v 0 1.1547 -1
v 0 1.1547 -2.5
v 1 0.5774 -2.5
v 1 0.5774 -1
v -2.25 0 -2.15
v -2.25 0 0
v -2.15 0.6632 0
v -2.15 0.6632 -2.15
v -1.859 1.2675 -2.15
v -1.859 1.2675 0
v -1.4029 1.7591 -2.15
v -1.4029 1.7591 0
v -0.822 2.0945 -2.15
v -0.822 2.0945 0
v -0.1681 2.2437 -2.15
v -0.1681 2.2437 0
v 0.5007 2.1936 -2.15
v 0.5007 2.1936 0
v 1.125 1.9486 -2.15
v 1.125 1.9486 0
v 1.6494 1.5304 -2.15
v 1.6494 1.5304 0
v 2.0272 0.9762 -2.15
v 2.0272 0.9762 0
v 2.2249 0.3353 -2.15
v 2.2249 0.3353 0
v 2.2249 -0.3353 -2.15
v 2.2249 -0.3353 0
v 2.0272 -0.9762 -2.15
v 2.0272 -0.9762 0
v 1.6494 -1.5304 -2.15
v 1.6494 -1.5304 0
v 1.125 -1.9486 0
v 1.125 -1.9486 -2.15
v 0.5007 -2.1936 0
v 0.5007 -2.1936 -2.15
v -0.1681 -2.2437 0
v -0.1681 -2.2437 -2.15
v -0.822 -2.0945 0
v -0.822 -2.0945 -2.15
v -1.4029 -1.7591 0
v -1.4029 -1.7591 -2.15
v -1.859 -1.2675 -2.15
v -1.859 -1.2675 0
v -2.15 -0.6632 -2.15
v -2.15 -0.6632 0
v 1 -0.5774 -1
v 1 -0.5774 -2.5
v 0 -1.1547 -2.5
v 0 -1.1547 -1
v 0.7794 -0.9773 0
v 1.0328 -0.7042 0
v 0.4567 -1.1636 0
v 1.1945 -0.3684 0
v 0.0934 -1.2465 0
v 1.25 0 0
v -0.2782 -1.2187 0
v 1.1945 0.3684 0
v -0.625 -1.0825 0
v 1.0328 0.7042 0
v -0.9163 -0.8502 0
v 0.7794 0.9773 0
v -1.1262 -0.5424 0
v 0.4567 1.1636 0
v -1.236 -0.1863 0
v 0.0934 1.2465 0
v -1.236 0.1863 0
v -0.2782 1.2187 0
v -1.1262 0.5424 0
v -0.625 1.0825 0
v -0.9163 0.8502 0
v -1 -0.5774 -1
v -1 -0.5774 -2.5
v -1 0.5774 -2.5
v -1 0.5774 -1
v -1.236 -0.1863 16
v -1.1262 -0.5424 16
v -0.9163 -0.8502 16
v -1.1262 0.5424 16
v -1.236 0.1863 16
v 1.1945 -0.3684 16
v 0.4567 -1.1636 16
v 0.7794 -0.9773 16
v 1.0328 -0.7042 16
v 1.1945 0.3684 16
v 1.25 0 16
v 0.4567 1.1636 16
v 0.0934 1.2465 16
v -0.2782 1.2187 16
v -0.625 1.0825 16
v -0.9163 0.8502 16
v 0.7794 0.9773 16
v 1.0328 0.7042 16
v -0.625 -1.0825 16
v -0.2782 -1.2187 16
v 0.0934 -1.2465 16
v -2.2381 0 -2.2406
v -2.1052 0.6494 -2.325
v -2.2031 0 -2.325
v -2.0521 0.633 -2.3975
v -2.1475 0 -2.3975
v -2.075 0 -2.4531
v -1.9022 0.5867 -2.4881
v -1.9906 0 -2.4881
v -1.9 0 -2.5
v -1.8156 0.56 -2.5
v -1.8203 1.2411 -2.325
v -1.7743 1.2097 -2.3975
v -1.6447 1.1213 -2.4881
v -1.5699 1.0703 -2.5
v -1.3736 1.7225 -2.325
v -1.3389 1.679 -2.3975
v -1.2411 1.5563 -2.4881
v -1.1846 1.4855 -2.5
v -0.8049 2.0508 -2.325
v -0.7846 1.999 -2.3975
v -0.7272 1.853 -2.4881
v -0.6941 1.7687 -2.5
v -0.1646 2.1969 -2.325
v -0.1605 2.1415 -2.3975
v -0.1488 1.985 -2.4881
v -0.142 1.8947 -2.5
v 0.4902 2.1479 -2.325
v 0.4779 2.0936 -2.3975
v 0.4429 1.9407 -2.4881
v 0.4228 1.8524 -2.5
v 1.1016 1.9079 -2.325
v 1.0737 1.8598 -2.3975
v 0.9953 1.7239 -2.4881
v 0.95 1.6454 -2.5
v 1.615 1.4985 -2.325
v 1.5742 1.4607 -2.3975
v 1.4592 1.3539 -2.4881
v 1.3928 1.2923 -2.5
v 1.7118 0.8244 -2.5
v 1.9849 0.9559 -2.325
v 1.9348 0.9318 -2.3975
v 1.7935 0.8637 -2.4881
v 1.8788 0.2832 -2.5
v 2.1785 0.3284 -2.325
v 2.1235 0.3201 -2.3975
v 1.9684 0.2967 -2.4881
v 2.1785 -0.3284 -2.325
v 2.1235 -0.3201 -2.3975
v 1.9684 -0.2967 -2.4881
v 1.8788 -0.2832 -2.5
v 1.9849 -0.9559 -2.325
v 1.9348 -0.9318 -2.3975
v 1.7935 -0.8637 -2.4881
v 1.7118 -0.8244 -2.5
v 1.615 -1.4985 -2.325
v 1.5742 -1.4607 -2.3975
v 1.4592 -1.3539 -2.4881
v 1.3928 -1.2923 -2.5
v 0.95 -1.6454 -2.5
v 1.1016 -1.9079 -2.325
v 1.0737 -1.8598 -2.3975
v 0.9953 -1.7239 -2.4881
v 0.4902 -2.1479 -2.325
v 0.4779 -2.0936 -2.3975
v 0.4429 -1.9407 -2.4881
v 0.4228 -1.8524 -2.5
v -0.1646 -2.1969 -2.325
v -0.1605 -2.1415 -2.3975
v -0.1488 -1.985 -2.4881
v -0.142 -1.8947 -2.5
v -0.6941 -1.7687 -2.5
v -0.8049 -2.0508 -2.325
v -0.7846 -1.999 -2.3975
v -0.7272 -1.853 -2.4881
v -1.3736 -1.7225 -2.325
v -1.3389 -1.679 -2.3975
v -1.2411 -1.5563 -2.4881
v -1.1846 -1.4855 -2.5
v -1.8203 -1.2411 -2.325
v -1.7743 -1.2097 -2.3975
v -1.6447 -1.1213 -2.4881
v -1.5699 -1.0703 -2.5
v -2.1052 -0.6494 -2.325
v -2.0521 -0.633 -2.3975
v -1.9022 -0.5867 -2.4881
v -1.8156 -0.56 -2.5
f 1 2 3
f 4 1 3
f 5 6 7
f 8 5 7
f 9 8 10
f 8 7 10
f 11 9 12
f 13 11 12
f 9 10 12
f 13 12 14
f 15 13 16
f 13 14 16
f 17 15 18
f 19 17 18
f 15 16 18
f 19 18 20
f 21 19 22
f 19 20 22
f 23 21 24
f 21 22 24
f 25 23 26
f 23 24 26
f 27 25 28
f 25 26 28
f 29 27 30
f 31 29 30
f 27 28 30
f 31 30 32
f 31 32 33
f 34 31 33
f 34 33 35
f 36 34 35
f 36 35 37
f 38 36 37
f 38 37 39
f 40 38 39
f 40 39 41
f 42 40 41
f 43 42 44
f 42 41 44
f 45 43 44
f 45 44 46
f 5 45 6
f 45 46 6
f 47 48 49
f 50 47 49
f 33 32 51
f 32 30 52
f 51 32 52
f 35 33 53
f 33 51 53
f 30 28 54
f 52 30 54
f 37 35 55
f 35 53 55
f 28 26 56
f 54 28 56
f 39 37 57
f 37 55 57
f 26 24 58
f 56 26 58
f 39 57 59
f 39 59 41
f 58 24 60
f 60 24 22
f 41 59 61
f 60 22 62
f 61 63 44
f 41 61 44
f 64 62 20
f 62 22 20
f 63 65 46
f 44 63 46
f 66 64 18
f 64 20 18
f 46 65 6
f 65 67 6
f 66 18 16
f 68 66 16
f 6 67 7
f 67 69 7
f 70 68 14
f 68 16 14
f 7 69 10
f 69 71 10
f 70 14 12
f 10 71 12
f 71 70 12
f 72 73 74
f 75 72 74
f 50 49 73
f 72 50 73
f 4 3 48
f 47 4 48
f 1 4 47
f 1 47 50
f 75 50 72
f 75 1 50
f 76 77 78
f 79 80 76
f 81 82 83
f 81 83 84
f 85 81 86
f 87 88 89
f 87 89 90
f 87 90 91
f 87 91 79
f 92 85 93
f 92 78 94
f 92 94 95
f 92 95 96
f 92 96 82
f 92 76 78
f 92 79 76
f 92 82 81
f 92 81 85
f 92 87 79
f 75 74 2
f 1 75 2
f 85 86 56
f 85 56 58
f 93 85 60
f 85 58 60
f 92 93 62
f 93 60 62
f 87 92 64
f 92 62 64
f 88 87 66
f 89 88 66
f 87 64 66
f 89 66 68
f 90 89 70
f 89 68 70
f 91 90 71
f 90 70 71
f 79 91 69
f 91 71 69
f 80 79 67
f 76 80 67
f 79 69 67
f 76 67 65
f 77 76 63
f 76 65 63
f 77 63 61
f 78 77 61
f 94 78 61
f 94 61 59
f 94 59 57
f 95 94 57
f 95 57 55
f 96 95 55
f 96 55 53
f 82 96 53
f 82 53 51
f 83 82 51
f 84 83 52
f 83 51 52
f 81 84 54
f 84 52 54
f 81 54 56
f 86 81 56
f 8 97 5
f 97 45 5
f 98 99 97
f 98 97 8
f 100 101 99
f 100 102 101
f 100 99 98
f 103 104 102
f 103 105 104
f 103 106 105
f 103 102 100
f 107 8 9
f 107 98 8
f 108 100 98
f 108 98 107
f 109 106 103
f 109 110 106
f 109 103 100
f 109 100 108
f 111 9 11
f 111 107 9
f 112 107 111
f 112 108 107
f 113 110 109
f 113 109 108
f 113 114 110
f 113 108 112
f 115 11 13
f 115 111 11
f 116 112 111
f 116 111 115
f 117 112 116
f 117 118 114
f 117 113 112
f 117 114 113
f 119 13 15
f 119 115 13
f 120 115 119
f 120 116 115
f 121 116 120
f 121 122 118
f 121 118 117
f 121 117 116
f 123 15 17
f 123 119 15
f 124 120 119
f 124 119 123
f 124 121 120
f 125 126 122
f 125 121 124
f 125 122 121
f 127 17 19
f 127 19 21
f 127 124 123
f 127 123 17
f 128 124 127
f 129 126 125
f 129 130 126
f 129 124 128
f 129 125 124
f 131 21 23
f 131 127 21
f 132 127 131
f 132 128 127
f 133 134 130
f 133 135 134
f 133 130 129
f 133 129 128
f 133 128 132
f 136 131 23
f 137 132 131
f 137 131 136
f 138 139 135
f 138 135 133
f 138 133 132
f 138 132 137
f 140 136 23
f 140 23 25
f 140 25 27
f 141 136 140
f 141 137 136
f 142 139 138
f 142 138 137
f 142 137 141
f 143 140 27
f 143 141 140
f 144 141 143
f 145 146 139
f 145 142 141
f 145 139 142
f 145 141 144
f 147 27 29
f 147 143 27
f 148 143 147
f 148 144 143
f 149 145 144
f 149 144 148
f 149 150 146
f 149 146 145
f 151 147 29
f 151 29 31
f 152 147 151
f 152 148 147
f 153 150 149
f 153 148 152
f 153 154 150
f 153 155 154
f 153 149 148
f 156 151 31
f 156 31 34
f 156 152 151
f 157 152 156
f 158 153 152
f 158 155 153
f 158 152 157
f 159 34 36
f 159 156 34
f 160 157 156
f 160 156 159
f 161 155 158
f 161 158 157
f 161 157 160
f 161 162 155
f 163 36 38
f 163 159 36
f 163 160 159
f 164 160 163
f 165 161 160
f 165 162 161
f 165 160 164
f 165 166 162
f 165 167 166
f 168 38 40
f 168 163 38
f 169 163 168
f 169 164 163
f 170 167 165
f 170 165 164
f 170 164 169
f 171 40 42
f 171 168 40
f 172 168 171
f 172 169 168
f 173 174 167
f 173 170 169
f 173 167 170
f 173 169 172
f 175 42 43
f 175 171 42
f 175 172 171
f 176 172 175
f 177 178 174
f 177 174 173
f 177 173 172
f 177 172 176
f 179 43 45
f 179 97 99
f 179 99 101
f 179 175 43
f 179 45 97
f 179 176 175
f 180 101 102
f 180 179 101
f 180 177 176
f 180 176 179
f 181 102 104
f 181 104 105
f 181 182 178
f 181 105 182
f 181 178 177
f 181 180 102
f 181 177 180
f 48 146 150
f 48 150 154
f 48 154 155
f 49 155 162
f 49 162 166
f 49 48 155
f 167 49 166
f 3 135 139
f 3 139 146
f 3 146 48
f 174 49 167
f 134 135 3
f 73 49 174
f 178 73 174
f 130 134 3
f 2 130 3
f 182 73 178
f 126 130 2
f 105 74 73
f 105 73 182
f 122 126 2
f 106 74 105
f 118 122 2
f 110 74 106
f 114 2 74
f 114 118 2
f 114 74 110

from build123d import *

# Parameters (mm, degrees)
CROQUIS1_R              = 1.25
SALIENTE_EXTRUIR1_DEPTH = 16
CROQUIS2_R              = 2.25
SALIENTE_EXTRUIR2_DEPTH = 2.5
CORTAR_EXTRUIR1_DEPTH   = 1.5
REDONDEO1_R             = 0.35


with BuildPart() as part:
    # Croquis1 → Saliente-Extruir1 (new body)
    with BuildSketch(Plane.XY):
        Circle(CROQUIS1_R)
    extrude(amount=SALIENTE_EXTRUIR1_DEPTH)

    # Croquis2 → Saliente-Extruir2 (add)
    with BuildSketch(Plane(origin=(0, 0, 0), x_dir=(-1, 0, 0), z_dir=(0, 0, -1))):
        Circle(CROQUIS2_R)
    extrude(amount=SALIENTE_EXTRUIR2_DEPTH)

    # Croquis3 → Cortar-Extruir1 (cut)
    with BuildSketch(Plane(origin=(0, 0, -2.5), x_dir=(-1, 0, 0), z_dir=(0, 0, -1))):
        Polygon((0, -1.154700538), (1, -0.577350269), (1, 0.577350269), (0, 1.154700538), (-1, 0.577350269), (-1, -0.577350269), align=None)
    extrude(amount=-CORTAR_EXTRUIR1_DEPTH, mode=Mode.SUBTRACT)

    # Redondeo1
    redondeo1_edges = [part.edges().sort_by_distance(p)[0] for p in [
        (2.25, 0, -2.5),
    ]]
    fillet(redondeo1_edges, radius=REDONDEO1_R)


solid = part.part
